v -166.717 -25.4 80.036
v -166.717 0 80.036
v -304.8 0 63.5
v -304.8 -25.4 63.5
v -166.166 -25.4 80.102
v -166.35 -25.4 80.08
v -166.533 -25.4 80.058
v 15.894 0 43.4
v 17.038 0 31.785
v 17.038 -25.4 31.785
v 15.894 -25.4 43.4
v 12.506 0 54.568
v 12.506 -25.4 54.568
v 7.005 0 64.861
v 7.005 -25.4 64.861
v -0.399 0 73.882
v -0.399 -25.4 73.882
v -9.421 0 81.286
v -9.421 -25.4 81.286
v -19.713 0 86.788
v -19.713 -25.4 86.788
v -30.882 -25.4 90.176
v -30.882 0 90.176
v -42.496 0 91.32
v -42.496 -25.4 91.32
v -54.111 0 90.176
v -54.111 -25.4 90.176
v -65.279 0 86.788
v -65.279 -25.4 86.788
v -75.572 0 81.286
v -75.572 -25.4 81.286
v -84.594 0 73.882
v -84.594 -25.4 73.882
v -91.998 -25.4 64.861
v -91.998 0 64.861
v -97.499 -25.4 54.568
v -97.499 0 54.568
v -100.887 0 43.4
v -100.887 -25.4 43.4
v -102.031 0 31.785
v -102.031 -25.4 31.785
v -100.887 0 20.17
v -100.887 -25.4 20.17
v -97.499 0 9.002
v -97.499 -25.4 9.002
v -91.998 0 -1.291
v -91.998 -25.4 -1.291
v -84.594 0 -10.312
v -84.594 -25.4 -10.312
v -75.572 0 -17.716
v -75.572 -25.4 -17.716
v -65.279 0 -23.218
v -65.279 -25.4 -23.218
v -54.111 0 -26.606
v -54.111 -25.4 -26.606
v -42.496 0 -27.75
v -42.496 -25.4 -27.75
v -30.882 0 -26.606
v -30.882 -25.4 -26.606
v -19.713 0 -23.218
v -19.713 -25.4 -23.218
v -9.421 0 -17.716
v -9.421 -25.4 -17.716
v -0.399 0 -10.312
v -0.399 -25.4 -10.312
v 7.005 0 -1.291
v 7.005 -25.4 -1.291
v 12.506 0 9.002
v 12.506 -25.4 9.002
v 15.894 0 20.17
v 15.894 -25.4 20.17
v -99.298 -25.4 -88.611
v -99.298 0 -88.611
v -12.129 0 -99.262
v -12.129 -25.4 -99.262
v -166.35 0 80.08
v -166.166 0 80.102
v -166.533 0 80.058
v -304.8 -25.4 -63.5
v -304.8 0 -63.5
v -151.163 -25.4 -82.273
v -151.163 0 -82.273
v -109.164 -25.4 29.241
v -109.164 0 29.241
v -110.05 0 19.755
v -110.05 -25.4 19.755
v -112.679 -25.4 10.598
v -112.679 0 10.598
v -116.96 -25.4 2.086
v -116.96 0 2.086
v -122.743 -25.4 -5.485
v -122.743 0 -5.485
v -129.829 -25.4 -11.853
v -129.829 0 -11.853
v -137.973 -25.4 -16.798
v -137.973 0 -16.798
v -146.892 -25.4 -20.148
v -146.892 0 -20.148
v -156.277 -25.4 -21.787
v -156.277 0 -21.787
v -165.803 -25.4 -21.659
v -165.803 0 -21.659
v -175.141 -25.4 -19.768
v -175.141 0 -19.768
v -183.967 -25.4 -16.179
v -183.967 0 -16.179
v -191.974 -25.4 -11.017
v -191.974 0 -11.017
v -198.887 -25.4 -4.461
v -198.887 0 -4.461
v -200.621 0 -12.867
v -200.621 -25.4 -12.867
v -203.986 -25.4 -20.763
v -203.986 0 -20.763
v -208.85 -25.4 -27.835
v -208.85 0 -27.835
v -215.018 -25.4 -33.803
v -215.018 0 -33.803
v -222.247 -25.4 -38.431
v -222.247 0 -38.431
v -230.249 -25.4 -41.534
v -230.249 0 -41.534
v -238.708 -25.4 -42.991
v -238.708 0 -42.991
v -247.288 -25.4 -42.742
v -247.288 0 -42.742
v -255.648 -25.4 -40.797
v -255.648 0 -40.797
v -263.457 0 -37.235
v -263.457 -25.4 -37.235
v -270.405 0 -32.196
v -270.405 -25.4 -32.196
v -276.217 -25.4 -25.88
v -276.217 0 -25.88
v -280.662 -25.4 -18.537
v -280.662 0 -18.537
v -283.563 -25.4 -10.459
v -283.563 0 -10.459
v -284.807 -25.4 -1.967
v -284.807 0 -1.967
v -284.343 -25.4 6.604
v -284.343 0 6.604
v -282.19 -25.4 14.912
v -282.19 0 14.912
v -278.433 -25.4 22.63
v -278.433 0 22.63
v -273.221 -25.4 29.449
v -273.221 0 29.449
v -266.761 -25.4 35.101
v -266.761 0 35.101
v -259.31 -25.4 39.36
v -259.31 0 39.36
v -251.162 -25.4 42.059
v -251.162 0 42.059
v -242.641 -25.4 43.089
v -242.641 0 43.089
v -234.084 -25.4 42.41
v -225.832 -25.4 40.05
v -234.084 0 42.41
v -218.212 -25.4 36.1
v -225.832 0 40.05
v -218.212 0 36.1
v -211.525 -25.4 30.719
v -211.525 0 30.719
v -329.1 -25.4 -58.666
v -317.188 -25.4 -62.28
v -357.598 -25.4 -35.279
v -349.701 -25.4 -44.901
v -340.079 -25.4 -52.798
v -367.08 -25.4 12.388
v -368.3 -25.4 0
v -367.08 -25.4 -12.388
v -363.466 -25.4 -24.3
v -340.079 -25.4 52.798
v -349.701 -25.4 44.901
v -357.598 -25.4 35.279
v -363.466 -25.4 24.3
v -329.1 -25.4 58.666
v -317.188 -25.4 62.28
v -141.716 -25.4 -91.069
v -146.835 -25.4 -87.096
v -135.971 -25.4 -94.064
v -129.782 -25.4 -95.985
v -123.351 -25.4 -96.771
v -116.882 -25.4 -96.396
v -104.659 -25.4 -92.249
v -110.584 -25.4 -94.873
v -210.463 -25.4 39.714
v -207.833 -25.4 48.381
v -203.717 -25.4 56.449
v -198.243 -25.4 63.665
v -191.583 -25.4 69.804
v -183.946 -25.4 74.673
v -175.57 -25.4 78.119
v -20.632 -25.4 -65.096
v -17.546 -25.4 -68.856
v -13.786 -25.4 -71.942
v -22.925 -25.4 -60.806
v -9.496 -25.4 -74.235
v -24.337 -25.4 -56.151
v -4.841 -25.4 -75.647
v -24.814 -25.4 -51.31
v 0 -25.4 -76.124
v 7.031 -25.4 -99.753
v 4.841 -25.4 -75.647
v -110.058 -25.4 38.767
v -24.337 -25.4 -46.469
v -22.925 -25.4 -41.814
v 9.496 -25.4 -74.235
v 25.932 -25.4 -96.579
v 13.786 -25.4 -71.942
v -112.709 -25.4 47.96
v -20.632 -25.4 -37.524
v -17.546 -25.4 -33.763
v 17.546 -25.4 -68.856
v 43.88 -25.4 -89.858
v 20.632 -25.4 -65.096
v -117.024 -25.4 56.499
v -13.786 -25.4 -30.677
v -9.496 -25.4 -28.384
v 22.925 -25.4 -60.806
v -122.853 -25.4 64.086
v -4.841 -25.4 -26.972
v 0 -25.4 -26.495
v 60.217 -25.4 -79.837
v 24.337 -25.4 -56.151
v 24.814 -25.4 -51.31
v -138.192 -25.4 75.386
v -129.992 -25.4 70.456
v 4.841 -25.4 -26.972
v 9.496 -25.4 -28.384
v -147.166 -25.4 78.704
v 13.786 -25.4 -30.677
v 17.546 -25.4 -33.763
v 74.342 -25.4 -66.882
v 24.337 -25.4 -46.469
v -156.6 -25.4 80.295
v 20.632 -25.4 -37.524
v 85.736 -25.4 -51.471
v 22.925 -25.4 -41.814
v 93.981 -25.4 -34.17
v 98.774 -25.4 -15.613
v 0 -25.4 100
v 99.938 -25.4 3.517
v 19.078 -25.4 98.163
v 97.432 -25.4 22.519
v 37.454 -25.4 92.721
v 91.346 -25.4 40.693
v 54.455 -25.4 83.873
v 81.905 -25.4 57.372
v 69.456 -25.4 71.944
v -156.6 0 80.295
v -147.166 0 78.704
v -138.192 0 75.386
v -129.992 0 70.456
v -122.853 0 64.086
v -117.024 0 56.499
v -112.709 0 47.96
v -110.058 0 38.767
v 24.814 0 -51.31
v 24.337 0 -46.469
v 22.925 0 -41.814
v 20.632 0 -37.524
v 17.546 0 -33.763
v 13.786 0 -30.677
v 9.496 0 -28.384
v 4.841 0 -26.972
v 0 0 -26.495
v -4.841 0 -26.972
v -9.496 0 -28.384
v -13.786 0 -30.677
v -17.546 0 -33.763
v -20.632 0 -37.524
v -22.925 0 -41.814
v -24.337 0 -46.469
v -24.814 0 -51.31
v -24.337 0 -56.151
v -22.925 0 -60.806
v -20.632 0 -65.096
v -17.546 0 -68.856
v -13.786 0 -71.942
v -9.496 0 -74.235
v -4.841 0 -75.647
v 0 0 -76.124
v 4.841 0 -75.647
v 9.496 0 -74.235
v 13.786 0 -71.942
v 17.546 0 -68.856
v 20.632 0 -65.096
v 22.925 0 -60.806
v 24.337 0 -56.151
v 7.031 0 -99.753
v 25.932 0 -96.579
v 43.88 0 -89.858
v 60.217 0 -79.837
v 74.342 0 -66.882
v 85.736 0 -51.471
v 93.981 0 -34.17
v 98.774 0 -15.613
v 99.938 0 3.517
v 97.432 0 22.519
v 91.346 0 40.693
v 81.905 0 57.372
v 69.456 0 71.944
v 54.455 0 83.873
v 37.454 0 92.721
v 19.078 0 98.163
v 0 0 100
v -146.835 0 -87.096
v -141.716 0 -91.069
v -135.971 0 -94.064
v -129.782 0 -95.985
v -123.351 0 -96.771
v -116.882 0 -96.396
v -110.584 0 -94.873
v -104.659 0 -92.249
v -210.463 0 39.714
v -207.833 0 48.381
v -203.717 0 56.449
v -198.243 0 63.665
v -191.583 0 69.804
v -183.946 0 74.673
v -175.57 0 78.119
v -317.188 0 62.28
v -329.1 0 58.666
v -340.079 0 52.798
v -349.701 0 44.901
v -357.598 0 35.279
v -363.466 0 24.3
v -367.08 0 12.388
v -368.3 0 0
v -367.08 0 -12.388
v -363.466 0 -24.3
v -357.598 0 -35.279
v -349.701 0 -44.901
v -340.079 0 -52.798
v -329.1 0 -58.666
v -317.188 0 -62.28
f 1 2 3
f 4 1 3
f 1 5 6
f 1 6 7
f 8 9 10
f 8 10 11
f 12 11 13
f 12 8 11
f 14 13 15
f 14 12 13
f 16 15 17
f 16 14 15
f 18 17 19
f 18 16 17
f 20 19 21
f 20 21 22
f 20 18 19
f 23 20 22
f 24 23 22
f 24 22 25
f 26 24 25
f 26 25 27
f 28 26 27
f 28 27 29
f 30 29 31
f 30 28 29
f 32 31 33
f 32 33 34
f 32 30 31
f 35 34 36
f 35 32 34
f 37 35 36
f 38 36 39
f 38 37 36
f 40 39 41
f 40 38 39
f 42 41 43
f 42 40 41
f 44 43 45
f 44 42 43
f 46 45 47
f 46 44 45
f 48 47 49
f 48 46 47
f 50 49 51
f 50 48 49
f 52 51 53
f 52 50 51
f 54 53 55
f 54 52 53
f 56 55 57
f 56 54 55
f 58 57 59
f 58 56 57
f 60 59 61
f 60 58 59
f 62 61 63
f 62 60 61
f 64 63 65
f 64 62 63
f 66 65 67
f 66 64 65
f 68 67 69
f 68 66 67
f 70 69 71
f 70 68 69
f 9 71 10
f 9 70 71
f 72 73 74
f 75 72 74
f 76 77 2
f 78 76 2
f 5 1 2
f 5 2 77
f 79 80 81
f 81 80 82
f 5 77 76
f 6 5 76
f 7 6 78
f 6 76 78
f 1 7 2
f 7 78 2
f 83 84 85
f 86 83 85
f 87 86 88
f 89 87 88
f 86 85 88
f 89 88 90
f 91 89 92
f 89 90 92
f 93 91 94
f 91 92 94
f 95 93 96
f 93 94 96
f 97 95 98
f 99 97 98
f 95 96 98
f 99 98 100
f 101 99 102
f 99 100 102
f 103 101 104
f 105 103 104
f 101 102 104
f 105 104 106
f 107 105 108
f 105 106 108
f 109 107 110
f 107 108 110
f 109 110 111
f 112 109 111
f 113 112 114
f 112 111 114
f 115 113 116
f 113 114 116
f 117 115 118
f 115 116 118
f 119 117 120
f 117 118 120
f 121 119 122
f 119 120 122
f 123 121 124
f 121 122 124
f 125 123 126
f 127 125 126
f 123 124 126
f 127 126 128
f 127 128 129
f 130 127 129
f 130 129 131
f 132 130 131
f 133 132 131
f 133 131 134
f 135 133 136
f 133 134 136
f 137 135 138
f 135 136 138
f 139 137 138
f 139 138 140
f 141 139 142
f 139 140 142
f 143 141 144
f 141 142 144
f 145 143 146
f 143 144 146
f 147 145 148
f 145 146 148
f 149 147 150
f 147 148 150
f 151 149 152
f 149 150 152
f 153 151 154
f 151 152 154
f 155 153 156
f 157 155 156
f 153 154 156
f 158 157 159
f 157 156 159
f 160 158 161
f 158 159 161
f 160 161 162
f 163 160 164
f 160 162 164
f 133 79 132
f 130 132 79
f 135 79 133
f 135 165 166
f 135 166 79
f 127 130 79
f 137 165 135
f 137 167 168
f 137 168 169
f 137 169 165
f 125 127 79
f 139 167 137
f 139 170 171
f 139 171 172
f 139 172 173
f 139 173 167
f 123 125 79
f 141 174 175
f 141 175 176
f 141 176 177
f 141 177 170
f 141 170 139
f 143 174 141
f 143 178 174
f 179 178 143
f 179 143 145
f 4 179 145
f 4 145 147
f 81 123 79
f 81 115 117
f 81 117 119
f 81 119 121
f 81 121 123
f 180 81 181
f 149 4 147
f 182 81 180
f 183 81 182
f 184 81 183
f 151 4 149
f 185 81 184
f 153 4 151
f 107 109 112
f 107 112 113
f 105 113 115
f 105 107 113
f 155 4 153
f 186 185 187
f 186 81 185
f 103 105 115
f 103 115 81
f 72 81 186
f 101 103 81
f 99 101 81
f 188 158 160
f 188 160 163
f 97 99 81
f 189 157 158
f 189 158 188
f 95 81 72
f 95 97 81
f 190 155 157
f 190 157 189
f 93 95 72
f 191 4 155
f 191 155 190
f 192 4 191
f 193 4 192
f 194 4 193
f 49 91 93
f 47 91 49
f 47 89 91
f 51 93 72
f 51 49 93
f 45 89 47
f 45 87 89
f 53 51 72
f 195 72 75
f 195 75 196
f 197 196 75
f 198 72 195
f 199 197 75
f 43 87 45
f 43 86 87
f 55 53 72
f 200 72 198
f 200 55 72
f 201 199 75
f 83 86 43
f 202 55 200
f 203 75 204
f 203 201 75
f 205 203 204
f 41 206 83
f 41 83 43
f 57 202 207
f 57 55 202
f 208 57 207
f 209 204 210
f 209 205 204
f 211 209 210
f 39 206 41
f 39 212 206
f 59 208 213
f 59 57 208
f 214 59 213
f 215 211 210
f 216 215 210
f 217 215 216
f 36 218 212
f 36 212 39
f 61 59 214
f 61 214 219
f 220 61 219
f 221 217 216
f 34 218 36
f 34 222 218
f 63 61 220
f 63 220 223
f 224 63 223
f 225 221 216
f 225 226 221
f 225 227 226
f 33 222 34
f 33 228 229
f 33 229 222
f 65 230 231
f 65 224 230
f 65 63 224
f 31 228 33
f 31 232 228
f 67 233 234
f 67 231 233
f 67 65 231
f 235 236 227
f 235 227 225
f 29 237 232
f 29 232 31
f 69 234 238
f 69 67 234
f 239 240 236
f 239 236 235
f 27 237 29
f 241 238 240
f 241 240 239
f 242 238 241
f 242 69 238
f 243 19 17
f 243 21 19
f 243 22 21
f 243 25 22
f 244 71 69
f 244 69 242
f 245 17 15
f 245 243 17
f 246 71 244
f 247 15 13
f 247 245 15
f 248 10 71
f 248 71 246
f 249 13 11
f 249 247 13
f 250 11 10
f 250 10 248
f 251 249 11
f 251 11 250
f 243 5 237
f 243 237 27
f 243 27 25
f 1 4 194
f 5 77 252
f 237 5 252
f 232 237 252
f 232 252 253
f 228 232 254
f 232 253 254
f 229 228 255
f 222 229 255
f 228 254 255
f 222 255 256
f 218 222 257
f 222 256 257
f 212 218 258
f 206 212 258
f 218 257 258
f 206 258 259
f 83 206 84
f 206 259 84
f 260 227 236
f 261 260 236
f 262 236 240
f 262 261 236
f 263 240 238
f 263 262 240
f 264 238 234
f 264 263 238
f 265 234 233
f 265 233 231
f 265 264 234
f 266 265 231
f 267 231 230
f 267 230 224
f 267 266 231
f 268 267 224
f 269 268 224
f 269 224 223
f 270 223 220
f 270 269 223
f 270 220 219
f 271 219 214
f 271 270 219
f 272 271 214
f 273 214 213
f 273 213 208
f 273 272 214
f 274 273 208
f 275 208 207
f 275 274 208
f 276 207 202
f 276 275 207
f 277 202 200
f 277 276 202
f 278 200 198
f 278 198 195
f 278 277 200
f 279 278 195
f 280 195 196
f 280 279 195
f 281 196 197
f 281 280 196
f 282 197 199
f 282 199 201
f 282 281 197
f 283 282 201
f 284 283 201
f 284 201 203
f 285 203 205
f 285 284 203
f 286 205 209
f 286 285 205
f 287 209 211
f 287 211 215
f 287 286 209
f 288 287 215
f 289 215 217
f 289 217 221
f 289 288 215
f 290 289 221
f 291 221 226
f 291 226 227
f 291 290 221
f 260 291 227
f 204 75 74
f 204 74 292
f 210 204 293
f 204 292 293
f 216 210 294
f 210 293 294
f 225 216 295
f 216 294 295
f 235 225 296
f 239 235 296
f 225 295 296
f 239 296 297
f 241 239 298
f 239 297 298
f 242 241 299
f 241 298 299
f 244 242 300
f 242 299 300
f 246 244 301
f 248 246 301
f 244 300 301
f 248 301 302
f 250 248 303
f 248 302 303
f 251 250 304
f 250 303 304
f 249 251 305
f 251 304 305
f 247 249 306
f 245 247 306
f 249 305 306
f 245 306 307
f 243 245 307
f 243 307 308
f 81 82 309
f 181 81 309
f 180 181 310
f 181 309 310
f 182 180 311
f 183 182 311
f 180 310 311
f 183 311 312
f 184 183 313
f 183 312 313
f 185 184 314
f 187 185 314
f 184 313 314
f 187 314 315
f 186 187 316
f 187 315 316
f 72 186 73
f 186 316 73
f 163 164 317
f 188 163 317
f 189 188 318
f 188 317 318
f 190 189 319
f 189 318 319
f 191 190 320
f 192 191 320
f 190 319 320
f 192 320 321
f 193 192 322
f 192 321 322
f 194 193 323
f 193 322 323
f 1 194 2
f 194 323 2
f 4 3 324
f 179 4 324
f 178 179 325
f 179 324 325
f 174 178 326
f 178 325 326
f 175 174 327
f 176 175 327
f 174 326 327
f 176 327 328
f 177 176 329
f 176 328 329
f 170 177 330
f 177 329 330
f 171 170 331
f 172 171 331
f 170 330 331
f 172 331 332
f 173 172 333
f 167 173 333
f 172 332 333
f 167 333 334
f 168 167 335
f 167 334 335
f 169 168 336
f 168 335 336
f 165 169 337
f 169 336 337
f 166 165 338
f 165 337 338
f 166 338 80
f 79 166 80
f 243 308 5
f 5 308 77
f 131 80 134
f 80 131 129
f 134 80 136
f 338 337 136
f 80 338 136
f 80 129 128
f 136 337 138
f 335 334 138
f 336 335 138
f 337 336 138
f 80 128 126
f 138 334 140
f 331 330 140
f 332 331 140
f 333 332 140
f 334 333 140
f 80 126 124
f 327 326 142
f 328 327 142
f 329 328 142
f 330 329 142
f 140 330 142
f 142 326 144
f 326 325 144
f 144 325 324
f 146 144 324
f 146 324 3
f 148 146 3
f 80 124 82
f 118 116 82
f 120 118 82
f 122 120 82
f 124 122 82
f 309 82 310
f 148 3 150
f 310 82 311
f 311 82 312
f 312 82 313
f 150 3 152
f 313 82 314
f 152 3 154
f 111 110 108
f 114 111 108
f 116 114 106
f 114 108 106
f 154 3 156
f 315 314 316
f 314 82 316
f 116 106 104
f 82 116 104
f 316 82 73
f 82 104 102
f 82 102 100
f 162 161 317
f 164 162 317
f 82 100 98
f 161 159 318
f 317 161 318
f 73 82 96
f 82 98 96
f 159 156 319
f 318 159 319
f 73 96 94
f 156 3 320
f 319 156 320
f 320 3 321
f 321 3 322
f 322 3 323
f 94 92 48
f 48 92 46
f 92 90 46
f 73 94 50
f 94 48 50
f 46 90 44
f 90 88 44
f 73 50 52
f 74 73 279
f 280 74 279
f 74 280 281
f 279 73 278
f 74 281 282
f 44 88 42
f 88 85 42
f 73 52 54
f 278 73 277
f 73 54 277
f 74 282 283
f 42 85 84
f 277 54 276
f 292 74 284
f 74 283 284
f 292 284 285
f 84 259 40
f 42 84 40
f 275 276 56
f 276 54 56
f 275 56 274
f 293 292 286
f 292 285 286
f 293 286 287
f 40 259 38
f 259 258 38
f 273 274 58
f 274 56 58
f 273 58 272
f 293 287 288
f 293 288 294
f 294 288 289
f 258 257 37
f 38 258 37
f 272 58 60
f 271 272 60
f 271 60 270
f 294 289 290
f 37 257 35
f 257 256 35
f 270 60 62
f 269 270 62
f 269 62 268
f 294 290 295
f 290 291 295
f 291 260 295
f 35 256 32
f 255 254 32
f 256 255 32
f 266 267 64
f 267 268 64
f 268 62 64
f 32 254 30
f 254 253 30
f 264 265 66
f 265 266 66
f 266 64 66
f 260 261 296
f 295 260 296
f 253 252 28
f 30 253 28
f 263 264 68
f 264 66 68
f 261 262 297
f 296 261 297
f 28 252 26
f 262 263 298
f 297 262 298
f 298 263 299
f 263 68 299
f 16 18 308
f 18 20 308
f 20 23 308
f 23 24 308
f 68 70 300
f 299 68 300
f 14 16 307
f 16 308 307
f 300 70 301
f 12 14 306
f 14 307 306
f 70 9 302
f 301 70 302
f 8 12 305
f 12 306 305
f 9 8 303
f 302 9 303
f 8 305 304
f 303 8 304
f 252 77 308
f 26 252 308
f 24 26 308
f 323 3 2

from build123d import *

# Parameters (mm, degrees)
F0_R     = 24.8141888618
F0_R_2   = 59.5346246142
F1_DEPTH = 25.4


with BuildPart() as f1:
    # F0 (on Front) → F1 (new body)
    with BuildSketch(Plane.XZ):
        with BuildLine():
            Line((-99.2976298759, -88.6105044971), (-12.1288724864, -99.2617270261))
            ThreePointArc((-12.1288724864, -99.2617270261), (99.8152611143, -6.0756603504), (0, 100))
            Line((0, 100), (-166.1658385565, 80.1015318002))
            ThreePointArc((-166.1658385565, 80.1015318002), (-126.2736372151, 67.4381308089), (-109.1637541986, 29.2412545532))
            ThreePointArc((-109.1637541986, 29.2412545532), (-142.3543083636, -18.6806916137), (-198.8867849114, -4.4608144844))
            ThreePointArc((-198.8867849114, -4.4608144844), (-282.3141058144, -14.5707555174), (-211.5247269524, 30.7193385549))
            ThreePointArc((-211.5247269524, 30.7193385549), (-198.2429888587, 63.6654948362), (-166.717182755, 80.0355079706))
            Line((-166.717182755, 80.0355079706), (-304.8, 63.5))
            ThreePointArc((-304.8, 63.5), (-368.3, 0), (-304.8, -63.5))
            Line((-304.8, -63.5), (-151.1628675473, -82.2730482283))
            ThreePointArc((-151.1628675473, -82.2730482283), (-133.5991325998, -26.3279382936), (-86.0463709553, -60.6364645064))
            ThreePointArc((-86.0463709553, -60.6364645064), (-89.5267066571, -76.1134052278), (-99.2976298759, -88.6105044971))
        make_face()
        with Locations((0, -51.3095334172)):
            Circle(F0_R, mode=Mode.SUBTRACT)
        with Locations((-42.4963980913, 31.7849628627)):
            Circle(F0_R_2, mode=Mode.SUBTRACT)
        with BuildLine():
            ThreePointArc((-151.1628675473, -82.2730482283), (-126.5842058284, -96.5224536382), (-99.2976298759, -88.6105044971))
            Line((-99.2976298759, -88.6105044971), (-151.1628675473, -82.2730482283))
        make_face()
        with BuildLine():
            Line((-151.1628675473, -82.2730482283), (-99.2976298759, -88.6105044971))
            ThreePointArc((-99.2976298759, -88.6105044971), (-89.5267066571, -76.1134052278), (-86.0463709553, -60.6364645064))
            ThreePointArc((-86.0463709553, -60.6364645064), (-133.5991325998, -26.3279382936), (-151.1628675473, -82.2730482283))
        make_face()
    extrude(amount=F1_DEPTH)


with BuildPart() as f1b:
    # F0 (on Front) → F1, piece 2 (new body)
    with BuildSketch(Plane.XZ):
        with BuildLine():
            Line((-166.717182755, 80.0355079706), (-166.1658385565, 80.1015318002))
            ThreePointArc((-166.1658385565, 80.1015318002), (-166.4416001786, 80.069267462), (-166.717182755, 80.0355079706))
        make_face()
    extrude(amount=F1_DEPTH)


solid = Compound([f1.part, f1b.part])
